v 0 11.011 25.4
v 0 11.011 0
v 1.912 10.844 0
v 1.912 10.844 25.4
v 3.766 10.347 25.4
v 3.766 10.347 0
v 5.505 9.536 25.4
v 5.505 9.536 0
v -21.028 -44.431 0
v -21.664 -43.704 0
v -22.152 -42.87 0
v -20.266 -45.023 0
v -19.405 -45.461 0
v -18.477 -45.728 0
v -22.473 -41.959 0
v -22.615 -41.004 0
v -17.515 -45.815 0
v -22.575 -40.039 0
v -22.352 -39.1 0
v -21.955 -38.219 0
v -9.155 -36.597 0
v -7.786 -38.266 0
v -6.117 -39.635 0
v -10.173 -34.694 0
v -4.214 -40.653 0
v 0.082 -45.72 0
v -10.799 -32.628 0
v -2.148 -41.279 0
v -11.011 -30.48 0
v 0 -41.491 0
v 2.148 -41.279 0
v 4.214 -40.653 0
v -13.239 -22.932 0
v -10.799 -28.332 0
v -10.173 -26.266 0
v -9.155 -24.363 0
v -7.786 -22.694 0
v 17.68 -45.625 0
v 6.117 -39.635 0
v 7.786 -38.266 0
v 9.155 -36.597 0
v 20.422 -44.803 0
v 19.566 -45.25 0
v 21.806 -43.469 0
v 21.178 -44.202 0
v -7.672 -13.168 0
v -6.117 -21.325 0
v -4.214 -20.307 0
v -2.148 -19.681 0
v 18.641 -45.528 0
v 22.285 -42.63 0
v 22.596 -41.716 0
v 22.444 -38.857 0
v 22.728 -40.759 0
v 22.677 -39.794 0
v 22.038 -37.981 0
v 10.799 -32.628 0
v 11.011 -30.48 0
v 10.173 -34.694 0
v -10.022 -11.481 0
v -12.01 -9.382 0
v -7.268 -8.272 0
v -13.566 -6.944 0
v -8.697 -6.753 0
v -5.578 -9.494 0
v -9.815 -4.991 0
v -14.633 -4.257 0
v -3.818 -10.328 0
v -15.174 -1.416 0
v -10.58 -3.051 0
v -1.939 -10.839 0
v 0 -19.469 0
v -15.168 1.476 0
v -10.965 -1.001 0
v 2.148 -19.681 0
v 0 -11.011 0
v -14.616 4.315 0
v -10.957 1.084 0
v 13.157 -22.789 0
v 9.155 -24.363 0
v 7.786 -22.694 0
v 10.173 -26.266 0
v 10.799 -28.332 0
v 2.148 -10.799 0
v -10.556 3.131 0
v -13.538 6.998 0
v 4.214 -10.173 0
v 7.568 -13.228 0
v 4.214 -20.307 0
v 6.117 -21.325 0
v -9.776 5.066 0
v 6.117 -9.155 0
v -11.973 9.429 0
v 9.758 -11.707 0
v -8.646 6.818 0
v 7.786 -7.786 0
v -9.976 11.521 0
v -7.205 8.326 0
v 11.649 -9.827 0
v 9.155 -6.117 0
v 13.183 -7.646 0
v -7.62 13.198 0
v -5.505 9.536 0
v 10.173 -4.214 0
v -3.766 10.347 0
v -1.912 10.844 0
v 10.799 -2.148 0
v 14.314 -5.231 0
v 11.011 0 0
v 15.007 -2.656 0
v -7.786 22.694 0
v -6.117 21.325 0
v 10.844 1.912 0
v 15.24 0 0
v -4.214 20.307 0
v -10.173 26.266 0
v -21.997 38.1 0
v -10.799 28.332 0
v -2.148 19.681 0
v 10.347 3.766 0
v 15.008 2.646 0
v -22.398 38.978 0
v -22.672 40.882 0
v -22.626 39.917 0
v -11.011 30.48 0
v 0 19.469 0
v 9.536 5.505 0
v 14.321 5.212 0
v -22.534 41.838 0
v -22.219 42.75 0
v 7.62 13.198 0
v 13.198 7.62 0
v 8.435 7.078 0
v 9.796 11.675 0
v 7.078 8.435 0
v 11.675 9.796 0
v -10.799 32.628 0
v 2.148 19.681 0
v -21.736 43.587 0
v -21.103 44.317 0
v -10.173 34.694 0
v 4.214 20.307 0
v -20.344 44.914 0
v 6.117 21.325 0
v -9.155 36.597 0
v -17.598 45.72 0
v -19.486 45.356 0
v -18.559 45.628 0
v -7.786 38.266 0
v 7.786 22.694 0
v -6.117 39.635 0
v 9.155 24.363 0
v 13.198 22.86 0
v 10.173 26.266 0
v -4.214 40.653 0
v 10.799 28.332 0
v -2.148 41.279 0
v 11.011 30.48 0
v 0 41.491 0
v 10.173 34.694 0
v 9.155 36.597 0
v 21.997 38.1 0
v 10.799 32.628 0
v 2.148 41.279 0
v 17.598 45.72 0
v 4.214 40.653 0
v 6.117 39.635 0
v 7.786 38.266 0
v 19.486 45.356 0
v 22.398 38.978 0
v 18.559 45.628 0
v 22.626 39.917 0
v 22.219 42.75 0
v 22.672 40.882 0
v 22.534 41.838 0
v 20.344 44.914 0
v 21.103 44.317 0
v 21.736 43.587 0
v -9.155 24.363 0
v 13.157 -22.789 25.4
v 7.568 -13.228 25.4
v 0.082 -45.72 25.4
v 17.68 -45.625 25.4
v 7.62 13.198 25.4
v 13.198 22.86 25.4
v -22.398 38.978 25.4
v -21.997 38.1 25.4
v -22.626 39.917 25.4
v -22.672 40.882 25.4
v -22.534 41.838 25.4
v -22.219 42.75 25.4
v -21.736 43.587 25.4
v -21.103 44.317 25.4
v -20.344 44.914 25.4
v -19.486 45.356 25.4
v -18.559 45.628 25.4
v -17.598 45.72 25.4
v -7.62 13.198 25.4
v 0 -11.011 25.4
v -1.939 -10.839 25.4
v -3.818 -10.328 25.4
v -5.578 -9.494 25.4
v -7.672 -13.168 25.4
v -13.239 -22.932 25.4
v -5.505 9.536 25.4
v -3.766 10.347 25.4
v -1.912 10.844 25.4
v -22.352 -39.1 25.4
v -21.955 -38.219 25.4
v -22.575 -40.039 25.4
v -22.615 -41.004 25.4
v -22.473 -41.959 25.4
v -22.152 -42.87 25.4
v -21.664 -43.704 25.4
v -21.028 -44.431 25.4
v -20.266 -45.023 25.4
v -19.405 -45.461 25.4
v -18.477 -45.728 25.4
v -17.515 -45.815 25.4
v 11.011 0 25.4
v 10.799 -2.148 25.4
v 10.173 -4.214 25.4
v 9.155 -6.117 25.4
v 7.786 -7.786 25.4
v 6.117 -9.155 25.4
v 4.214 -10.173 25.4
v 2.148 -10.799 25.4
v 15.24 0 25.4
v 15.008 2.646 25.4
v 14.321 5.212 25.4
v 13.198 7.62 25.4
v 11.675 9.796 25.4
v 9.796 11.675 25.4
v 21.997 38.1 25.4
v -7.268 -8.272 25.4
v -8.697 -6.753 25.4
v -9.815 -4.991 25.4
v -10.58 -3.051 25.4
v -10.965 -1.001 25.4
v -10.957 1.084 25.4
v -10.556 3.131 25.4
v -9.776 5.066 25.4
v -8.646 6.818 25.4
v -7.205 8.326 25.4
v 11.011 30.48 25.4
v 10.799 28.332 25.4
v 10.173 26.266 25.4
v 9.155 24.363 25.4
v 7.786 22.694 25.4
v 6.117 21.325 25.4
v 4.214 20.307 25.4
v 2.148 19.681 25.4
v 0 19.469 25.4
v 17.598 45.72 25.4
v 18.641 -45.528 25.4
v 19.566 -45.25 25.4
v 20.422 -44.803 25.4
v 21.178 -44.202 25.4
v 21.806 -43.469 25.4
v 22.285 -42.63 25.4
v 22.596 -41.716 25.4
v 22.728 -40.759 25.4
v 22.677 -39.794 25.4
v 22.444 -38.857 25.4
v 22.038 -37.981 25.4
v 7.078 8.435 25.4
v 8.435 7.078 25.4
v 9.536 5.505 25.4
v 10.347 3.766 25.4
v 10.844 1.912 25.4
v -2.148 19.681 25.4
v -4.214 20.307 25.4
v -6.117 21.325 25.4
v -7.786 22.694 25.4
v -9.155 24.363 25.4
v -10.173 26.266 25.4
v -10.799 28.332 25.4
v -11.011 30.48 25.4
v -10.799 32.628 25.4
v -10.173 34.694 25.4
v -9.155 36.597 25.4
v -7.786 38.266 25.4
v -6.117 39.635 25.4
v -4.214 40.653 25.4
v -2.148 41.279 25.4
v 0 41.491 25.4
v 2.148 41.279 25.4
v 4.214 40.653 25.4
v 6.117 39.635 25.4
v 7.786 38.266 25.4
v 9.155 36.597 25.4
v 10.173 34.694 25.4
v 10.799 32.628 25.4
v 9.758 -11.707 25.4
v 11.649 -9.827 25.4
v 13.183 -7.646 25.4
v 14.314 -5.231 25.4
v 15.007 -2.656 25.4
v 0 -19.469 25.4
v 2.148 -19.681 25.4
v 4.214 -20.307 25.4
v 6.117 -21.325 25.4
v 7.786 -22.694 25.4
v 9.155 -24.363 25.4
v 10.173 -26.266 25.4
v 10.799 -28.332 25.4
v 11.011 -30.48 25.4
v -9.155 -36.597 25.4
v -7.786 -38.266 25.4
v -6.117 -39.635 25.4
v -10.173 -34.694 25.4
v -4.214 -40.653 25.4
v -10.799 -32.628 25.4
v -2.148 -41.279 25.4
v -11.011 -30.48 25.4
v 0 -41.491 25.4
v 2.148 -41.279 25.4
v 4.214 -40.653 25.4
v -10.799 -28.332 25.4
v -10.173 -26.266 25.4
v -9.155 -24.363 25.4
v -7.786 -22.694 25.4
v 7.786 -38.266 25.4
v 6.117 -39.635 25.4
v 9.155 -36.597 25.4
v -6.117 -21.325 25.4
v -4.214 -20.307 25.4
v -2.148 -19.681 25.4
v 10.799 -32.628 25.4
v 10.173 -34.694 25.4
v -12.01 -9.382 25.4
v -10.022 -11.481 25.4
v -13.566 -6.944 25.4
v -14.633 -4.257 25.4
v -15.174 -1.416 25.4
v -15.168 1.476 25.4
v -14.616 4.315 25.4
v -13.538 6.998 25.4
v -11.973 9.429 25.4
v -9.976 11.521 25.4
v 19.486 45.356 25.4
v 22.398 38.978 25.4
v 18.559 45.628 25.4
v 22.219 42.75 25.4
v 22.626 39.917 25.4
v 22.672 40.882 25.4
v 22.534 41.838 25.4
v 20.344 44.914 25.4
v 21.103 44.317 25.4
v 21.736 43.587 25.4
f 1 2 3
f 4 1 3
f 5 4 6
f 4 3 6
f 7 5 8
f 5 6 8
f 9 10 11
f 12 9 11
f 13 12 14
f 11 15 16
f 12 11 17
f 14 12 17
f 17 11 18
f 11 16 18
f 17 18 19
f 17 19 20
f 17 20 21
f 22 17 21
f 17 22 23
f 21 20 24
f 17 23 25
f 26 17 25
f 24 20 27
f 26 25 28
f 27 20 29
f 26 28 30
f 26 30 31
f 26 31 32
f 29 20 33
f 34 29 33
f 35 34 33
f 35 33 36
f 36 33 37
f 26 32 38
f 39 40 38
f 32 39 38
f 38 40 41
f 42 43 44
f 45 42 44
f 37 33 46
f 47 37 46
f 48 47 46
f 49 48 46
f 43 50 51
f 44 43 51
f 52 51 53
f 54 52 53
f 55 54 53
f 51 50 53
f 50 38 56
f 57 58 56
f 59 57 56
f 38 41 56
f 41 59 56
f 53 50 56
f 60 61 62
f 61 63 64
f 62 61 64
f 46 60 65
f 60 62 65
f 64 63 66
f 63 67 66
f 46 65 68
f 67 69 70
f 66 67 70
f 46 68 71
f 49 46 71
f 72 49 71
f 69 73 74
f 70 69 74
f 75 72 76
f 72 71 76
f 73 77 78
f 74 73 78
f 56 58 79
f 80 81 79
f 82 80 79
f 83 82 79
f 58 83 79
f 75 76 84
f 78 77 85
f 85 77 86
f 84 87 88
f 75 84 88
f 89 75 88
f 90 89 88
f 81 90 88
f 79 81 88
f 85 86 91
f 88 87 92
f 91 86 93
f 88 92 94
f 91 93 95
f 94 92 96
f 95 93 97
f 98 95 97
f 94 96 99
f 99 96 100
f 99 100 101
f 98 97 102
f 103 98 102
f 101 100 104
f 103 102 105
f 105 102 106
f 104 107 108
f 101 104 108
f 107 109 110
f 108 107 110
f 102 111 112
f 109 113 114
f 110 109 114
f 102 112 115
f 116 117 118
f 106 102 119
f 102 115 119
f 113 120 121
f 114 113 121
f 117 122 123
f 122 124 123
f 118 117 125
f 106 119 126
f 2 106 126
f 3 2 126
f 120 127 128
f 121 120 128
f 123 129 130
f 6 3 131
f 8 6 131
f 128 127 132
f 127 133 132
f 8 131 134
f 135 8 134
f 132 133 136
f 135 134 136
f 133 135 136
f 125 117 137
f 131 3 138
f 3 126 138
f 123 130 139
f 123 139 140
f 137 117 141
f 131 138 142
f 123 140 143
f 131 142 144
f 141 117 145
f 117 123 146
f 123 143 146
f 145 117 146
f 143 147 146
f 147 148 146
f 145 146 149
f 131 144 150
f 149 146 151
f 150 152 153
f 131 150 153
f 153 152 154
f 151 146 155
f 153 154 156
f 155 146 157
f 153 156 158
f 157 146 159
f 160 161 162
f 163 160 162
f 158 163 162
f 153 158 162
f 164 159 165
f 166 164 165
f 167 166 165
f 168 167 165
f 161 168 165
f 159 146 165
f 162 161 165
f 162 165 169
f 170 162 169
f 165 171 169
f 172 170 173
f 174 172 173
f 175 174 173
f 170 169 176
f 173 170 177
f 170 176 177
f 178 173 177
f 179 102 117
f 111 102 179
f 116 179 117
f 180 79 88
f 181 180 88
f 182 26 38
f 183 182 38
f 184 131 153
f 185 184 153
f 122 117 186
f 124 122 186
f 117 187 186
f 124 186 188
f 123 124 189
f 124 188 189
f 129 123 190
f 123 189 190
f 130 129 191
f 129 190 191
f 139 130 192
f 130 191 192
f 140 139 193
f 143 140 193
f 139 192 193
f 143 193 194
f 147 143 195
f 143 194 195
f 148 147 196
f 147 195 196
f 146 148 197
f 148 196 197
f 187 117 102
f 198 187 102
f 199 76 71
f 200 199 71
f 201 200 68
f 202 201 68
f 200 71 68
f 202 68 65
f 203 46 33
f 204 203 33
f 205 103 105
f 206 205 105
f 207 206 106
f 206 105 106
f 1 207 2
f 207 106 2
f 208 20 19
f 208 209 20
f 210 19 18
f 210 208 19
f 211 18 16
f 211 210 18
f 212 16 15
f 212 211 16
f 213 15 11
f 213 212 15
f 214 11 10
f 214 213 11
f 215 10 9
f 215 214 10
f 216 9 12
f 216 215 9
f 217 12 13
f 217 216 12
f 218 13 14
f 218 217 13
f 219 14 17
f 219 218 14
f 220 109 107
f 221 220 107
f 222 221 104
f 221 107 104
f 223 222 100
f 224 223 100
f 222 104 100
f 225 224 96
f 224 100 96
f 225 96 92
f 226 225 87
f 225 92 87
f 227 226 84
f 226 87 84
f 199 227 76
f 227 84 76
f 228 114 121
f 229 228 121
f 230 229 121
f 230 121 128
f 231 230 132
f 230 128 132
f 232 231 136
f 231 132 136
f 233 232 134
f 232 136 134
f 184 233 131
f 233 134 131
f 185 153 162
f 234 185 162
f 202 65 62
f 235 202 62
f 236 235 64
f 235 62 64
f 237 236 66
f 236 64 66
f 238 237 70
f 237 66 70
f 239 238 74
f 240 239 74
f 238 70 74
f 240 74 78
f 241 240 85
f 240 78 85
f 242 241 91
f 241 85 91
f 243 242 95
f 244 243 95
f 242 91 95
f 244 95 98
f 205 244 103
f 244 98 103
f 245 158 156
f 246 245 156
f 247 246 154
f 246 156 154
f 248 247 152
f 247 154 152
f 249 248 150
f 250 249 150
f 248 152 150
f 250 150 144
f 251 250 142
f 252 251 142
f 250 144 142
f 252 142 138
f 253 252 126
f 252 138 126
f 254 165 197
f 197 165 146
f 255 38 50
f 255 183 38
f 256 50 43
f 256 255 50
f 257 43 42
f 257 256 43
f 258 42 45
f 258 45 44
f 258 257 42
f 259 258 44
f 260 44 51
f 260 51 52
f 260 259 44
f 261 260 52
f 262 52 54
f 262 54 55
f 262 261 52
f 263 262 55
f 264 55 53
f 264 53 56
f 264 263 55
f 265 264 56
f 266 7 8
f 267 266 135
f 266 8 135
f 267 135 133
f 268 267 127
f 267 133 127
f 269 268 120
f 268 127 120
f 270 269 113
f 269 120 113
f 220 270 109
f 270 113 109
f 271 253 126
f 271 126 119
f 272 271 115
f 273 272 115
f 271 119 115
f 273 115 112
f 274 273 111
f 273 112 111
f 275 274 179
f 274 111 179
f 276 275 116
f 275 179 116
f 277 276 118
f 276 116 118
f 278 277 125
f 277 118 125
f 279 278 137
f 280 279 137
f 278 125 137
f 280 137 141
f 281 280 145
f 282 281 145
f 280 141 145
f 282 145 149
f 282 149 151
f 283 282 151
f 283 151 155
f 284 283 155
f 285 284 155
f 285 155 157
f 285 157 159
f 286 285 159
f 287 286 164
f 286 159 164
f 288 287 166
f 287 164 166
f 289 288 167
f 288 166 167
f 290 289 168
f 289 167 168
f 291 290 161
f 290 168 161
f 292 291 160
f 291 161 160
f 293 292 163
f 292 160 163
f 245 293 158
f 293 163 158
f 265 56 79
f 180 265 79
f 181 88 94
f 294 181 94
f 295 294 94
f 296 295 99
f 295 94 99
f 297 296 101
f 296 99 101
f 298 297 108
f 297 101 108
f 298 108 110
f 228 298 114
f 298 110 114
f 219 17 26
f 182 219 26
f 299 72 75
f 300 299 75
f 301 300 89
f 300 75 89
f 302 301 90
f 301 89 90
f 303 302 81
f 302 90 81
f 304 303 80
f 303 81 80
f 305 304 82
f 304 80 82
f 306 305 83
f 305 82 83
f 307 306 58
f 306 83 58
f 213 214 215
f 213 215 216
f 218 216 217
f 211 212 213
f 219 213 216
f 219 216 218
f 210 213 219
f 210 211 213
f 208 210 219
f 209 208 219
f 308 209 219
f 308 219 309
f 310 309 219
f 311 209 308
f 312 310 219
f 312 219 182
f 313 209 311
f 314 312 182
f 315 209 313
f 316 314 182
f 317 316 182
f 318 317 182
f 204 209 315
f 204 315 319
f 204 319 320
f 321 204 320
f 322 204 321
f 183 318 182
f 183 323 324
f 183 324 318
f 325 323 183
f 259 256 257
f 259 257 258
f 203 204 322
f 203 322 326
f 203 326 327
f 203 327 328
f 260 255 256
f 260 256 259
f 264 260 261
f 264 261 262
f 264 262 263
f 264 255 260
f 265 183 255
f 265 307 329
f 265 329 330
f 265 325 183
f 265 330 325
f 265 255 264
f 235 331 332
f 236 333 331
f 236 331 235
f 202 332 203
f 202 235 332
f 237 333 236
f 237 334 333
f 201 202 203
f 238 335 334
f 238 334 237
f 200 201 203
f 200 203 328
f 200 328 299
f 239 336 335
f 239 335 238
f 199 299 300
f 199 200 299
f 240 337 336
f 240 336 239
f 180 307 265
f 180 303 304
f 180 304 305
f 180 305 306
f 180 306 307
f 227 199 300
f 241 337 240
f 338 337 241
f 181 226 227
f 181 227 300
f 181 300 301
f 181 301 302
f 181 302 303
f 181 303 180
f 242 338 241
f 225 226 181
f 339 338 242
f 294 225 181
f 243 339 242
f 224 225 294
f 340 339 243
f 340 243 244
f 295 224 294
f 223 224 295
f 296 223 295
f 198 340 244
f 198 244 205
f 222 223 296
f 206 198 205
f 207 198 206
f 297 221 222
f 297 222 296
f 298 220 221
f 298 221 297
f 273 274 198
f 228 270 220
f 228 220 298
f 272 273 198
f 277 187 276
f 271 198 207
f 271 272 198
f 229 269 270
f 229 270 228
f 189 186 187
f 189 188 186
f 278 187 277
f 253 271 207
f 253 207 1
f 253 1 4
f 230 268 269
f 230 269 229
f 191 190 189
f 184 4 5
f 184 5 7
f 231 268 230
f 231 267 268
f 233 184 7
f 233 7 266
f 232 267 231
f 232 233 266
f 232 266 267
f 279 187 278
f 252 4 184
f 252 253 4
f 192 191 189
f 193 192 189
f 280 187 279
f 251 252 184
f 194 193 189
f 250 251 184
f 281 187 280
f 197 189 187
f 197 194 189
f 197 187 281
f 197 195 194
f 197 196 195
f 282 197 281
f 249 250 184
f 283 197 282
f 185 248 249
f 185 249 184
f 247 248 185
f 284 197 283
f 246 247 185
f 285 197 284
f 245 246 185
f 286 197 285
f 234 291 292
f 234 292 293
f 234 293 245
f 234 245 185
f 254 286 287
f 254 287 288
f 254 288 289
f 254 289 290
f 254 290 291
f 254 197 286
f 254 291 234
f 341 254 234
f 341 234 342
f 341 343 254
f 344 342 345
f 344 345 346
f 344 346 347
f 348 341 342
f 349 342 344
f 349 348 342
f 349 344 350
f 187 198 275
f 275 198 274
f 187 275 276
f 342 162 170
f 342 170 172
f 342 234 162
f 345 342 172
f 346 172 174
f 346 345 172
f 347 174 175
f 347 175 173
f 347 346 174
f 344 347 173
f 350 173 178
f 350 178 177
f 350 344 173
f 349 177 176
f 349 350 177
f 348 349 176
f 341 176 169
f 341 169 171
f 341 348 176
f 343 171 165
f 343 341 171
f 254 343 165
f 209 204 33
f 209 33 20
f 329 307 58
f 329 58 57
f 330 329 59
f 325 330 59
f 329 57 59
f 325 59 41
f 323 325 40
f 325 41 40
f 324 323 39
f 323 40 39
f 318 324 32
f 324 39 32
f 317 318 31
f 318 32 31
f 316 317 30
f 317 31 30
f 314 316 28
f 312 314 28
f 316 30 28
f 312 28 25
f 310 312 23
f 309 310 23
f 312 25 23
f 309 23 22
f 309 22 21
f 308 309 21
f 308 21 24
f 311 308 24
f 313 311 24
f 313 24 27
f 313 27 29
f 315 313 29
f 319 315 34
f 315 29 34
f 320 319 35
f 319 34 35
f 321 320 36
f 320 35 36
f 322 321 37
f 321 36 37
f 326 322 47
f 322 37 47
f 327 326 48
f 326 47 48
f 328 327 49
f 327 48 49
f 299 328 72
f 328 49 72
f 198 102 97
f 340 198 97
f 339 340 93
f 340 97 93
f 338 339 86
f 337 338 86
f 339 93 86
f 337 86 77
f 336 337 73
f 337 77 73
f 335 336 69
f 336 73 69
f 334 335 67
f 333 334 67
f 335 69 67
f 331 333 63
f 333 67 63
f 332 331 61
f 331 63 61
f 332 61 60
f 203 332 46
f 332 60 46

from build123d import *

# Parameters (mm, degrees)
F1_DEPTH = 25.4
F2_R     = 5.08
F3_R     = 5.08


with BuildPart() as f1:
    # F0 (on Top) → F1 (new body)
    with BuildSketch(Plane.XY):
        with BuildLine():
            Line((-26.3964543073, 45.72), (-13.1982270342, 22.8599997931))
            ThreePointArc((-13.1982270342, 22.8599997931), (-13.1982272083, 38.0999999054), (2.04e-08, 45.72))
            Line((2.04e-08, 45.72), (-26.3964543073, 45.72))
        make_face()
        with BuildLine():
            ThreePointArc((-13.1982270342, 22.8599997931), (-7.6199998966, 17.2817727866), (0, 15.24))
            ThreePointArc((0, 15.24), (7.6200000359, 17.281772867), (13.1982271951, 22.8600000717))
            ThreePointArc((13.1982271951, 22.8600000717), (14.7207096034, 26.5355977926), (15.24, 30.48))
            ThreePointArc((15.24, 30.48), (10.7763073525, 41.2563073381), (2.04e-08, 45.72))
            ThreePointArc((2.04e-08, 45.72), (-13.1982272083, 38.0999999054), (-13.1982270342, 22.8599997931))
        make_face()
        with BuildLine():
            ThreePointArc((11.0109, 30.48), (7.785882057, 22.694117943), (0, 19.4691))
            ThreePointArc((0, 19.4691), (-7.785882057, 38.265882057), (11.0109, 30.48))
        make_face(mode=Mode.SUBTRACT)
        with BuildLine():
            ThreePointArc((15.24, 30.48), (14.7207096034, 26.5355977926), (13.1982271951, 22.8600000717))
            Line((13.1982271951, 22.8600000717), (26.3964543073, 45.72))
            Line((26.3964543073, 45.72), (2.04e-08, 45.72))
            ThreePointArc((2.04e-08, 45.72), (10.7763073525, 41.2563073381), (15.24, 30.48))
        make_face()
        with BuildLine():
            ThreePointArc((0, 15.24), (3.9444022474, 14.7207095926), (7.62, 13.1982271537))
            Line((7.62, 13.1982271537), (13.1982271951, 22.8600000717))
            ThreePointArc((13.1982271951, 22.8600000717), (7.6200000359, 17.281772867), (0, 15.24))
        make_face()
        with BuildLine():
            ThreePointArc((-7.62, 13.1982271537), (-3.9444022474, 14.7207095926), (0, 15.24))
            ThreePointArc((0, 15.24), (-7.6199998966, 17.2817727866), (-13.1982270342, 22.8599997931))
            Line((-13.1982270342, 22.8599997931), (-7.62, 13.1982271537))
        make_face()
        with BuildLine():
            ThreePointArc((-5.50545, 9.5357191185), (-2.8498306237, 10.6357126807), (0, 11.0109))
            Line((0, 11.0109), (0, 15.24))
            ThreePointArc((0, 15.24), (-3.9444022474, 14.7207095926), (-7.62, 13.1982271537))
            Line((-7.62, 13.1982271537), (-5.50545, 9.5357191185))
        make_face()
        with BuildLine():
            ThreePointArc((0, 11.0109), (2.8498306237, 10.6357126807), (5.50545, 9.5357191185))
            Line((5.50545, 9.5357191185), (7.62, 13.1982271537))
            ThreePointArc((7.62, 13.1982271537), (3.9444022474, 14.7207095926), (0, 15.24))
            Line((0, 15.24), (0, 11.0109))
        make_face()
        with BuildLine():
            ThreePointArc((-5.5776126233, -9.4936903381), (-11.0108208297, 0.0417548278), (-5.50545, 9.5357191185))
            Line((-5.50545, 9.5357191185), (-7.62, 13.1982271537))
            ThreePointArc((-7.62, 13.1982271537), (-15.2399698636, 0.030307715), (-7.6724341256, -13.1678151031))
            Line((-7.6724341256, -13.1678151031), (-5.5776126233, -9.4936903381))
        make_face()
        with BuildLine():
            Line((0, -15.24), (0, -11.0109))
            ThreePointArc((0, -11.0109), (-2.8901421995, -10.6248292634), (-5.5776126233, -9.4936903381))
            Line((-5.5776126233, -9.4936903381), (-7.6724341256, -13.1678151031))
            ThreePointArc((-7.6724341256, -13.1678151031), (-3.9736694521, -14.7128362692), (0, -15.24))
        make_face()
        with BuildLine():
            Line((7.5678329537, -13.2282086612), (5.4333591334, -9.5769790298))
            ThreePointArc((5.4333591334, -9.5769790298), (2.8096939701, -10.6463861758), (0, -11.0109))
            Line((0, -11.0109), (0, -15.24))
            ThreePointArc((0, -15.24), (3.9153352349, -14.7284673337), (7.5678329537, -13.2282086612))
        make_face()
        with BuildLine():
            ThreePointArc((5.50545, 9.5357191185), (9.5357191185, 5.50545), (11.0109, 0))
            ThreePointArc((11.0109, 0), (9.5148855193, -5.5413782008), (5.4333591334, -9.5769790298))
            Line((5.4333591334, -9.5769790298), (7.5678329537, -13.2282086612))
            ThreePointArc((7.5678329537, -13.2282086612), (13.1831592233, -7.6460390329), (15.24, 0))
            ThreePointArc((15.24, 0), (13.1982271537, 7.62), (7.62, 13.1982271537))
            Line((7.62, 13.1982271537), (5.50545, 9.5357191185))
        make_face()
        with BuildLine():
            ThreePointArc((13.1567863006, -22.7886688902), (7.5842505855, -17.2611973668), (0, -15.24))
            ThreePointArc((0, -15.24), (-7.6556936027, -17.302445012), (-13.2392812888, -22.9315544013))
            ThreePointArc((-13.2392812888, -22.9315544013), (-13.1567861593, -38.1713313515), (0.0824955225, -45.7197767204))
            ThreePointArc((0.0824955225, -45.7197767204), (10.8054345531, -41.2271011961), (15.24, -30.48))
            ThreePointArc((15.24, -30.48), (14.7099800003, -26.4957700381), (13.1567863006, -22.7886688902))
        make_face()
        with BuildLine():
            ThreePointArc((11.0109, -30.48), (-7.785882057, -38.265882057), (0, -19.4691))
            ThreePointArc((0, -19.4691), (7.785882057, -22.694117943), (11.0109, -30.48))
        make_face(mode=Mode.SUBTRACT)
        with BuildLine():
            ThreePointArc((-13.2392812888, -22.9315544013), (-7.6556936027, -17.302445012), (0, -15.24))
            ThreePointArc((0, -15.24), (-3.9736694521, -14.7128362692), (-7.6724341256, -13.1678151031))
            Line((-7.6724341256, -13.1678151031), (-13.2392812888, -22.9315544013))
        make_face()
        with BuildLine():
            Line((13.1567863006, -22.7886688902), (7.5678329537, -13.2282086612))
            ThreePointArc((7.5678329537, -13.2282086612), (3.9153352349, -14.7284673337), (0, -15.24))
            ThreePointArc((0, -15.24), (7.5842505855, -17.2611973668), (13.1567863006, -22.7886688902))
        make_face()
        with BuildLine():
            Line((26.4785625289, -45.5768912828), (13.1567863006, -22.7886688902))
            ThreePointArc((13.1567863006, -22.7886688902), (14.7099800003, -26.4957700381), (15.24, -30.48))
            ThreePointArc((15.24, -30.48), (10.8054345531, -41.2271011961), (0.0824955225, -45.7197767204))
            Line((0.0824955225, -45.7197767204), (26.4785625289, -45.5768912828))
        make_face()
        with BuildLine():
            ThreePointArc((0.0824955225, -45.7197767204), (-13.1567861593, -38.1713313515), (-13.2392812888, -22.9315544013))
            Line((-13.2392812888, -22.9315544013), (-26.3135726335, -45.8626621643))
            Line((-26.3135726335, -45.8626621643), (0.0824955225, -45.7197767204))
        make_face()
    extrude(amount=F1_DEPTH)

    # F2
    f2_edges = [f1.edges().sort_by_distance(p)[0] for p in [
        (26.396454, 45.72, 12.7),
        (26.478563, -45.576891, 12.7),
        (-26.313573, -45.862662, 12.7),
    ]]
    fillet(f2_edges, radius=F2_R)

    # F3
    f3_edges = [f1.edges().sort_by_distance(p)[0] for p in [
        (-26.396454, 45.72, 12.7),
    ]]
    fillet(f3_edges, radius=F3_R)


solid = f1.part
